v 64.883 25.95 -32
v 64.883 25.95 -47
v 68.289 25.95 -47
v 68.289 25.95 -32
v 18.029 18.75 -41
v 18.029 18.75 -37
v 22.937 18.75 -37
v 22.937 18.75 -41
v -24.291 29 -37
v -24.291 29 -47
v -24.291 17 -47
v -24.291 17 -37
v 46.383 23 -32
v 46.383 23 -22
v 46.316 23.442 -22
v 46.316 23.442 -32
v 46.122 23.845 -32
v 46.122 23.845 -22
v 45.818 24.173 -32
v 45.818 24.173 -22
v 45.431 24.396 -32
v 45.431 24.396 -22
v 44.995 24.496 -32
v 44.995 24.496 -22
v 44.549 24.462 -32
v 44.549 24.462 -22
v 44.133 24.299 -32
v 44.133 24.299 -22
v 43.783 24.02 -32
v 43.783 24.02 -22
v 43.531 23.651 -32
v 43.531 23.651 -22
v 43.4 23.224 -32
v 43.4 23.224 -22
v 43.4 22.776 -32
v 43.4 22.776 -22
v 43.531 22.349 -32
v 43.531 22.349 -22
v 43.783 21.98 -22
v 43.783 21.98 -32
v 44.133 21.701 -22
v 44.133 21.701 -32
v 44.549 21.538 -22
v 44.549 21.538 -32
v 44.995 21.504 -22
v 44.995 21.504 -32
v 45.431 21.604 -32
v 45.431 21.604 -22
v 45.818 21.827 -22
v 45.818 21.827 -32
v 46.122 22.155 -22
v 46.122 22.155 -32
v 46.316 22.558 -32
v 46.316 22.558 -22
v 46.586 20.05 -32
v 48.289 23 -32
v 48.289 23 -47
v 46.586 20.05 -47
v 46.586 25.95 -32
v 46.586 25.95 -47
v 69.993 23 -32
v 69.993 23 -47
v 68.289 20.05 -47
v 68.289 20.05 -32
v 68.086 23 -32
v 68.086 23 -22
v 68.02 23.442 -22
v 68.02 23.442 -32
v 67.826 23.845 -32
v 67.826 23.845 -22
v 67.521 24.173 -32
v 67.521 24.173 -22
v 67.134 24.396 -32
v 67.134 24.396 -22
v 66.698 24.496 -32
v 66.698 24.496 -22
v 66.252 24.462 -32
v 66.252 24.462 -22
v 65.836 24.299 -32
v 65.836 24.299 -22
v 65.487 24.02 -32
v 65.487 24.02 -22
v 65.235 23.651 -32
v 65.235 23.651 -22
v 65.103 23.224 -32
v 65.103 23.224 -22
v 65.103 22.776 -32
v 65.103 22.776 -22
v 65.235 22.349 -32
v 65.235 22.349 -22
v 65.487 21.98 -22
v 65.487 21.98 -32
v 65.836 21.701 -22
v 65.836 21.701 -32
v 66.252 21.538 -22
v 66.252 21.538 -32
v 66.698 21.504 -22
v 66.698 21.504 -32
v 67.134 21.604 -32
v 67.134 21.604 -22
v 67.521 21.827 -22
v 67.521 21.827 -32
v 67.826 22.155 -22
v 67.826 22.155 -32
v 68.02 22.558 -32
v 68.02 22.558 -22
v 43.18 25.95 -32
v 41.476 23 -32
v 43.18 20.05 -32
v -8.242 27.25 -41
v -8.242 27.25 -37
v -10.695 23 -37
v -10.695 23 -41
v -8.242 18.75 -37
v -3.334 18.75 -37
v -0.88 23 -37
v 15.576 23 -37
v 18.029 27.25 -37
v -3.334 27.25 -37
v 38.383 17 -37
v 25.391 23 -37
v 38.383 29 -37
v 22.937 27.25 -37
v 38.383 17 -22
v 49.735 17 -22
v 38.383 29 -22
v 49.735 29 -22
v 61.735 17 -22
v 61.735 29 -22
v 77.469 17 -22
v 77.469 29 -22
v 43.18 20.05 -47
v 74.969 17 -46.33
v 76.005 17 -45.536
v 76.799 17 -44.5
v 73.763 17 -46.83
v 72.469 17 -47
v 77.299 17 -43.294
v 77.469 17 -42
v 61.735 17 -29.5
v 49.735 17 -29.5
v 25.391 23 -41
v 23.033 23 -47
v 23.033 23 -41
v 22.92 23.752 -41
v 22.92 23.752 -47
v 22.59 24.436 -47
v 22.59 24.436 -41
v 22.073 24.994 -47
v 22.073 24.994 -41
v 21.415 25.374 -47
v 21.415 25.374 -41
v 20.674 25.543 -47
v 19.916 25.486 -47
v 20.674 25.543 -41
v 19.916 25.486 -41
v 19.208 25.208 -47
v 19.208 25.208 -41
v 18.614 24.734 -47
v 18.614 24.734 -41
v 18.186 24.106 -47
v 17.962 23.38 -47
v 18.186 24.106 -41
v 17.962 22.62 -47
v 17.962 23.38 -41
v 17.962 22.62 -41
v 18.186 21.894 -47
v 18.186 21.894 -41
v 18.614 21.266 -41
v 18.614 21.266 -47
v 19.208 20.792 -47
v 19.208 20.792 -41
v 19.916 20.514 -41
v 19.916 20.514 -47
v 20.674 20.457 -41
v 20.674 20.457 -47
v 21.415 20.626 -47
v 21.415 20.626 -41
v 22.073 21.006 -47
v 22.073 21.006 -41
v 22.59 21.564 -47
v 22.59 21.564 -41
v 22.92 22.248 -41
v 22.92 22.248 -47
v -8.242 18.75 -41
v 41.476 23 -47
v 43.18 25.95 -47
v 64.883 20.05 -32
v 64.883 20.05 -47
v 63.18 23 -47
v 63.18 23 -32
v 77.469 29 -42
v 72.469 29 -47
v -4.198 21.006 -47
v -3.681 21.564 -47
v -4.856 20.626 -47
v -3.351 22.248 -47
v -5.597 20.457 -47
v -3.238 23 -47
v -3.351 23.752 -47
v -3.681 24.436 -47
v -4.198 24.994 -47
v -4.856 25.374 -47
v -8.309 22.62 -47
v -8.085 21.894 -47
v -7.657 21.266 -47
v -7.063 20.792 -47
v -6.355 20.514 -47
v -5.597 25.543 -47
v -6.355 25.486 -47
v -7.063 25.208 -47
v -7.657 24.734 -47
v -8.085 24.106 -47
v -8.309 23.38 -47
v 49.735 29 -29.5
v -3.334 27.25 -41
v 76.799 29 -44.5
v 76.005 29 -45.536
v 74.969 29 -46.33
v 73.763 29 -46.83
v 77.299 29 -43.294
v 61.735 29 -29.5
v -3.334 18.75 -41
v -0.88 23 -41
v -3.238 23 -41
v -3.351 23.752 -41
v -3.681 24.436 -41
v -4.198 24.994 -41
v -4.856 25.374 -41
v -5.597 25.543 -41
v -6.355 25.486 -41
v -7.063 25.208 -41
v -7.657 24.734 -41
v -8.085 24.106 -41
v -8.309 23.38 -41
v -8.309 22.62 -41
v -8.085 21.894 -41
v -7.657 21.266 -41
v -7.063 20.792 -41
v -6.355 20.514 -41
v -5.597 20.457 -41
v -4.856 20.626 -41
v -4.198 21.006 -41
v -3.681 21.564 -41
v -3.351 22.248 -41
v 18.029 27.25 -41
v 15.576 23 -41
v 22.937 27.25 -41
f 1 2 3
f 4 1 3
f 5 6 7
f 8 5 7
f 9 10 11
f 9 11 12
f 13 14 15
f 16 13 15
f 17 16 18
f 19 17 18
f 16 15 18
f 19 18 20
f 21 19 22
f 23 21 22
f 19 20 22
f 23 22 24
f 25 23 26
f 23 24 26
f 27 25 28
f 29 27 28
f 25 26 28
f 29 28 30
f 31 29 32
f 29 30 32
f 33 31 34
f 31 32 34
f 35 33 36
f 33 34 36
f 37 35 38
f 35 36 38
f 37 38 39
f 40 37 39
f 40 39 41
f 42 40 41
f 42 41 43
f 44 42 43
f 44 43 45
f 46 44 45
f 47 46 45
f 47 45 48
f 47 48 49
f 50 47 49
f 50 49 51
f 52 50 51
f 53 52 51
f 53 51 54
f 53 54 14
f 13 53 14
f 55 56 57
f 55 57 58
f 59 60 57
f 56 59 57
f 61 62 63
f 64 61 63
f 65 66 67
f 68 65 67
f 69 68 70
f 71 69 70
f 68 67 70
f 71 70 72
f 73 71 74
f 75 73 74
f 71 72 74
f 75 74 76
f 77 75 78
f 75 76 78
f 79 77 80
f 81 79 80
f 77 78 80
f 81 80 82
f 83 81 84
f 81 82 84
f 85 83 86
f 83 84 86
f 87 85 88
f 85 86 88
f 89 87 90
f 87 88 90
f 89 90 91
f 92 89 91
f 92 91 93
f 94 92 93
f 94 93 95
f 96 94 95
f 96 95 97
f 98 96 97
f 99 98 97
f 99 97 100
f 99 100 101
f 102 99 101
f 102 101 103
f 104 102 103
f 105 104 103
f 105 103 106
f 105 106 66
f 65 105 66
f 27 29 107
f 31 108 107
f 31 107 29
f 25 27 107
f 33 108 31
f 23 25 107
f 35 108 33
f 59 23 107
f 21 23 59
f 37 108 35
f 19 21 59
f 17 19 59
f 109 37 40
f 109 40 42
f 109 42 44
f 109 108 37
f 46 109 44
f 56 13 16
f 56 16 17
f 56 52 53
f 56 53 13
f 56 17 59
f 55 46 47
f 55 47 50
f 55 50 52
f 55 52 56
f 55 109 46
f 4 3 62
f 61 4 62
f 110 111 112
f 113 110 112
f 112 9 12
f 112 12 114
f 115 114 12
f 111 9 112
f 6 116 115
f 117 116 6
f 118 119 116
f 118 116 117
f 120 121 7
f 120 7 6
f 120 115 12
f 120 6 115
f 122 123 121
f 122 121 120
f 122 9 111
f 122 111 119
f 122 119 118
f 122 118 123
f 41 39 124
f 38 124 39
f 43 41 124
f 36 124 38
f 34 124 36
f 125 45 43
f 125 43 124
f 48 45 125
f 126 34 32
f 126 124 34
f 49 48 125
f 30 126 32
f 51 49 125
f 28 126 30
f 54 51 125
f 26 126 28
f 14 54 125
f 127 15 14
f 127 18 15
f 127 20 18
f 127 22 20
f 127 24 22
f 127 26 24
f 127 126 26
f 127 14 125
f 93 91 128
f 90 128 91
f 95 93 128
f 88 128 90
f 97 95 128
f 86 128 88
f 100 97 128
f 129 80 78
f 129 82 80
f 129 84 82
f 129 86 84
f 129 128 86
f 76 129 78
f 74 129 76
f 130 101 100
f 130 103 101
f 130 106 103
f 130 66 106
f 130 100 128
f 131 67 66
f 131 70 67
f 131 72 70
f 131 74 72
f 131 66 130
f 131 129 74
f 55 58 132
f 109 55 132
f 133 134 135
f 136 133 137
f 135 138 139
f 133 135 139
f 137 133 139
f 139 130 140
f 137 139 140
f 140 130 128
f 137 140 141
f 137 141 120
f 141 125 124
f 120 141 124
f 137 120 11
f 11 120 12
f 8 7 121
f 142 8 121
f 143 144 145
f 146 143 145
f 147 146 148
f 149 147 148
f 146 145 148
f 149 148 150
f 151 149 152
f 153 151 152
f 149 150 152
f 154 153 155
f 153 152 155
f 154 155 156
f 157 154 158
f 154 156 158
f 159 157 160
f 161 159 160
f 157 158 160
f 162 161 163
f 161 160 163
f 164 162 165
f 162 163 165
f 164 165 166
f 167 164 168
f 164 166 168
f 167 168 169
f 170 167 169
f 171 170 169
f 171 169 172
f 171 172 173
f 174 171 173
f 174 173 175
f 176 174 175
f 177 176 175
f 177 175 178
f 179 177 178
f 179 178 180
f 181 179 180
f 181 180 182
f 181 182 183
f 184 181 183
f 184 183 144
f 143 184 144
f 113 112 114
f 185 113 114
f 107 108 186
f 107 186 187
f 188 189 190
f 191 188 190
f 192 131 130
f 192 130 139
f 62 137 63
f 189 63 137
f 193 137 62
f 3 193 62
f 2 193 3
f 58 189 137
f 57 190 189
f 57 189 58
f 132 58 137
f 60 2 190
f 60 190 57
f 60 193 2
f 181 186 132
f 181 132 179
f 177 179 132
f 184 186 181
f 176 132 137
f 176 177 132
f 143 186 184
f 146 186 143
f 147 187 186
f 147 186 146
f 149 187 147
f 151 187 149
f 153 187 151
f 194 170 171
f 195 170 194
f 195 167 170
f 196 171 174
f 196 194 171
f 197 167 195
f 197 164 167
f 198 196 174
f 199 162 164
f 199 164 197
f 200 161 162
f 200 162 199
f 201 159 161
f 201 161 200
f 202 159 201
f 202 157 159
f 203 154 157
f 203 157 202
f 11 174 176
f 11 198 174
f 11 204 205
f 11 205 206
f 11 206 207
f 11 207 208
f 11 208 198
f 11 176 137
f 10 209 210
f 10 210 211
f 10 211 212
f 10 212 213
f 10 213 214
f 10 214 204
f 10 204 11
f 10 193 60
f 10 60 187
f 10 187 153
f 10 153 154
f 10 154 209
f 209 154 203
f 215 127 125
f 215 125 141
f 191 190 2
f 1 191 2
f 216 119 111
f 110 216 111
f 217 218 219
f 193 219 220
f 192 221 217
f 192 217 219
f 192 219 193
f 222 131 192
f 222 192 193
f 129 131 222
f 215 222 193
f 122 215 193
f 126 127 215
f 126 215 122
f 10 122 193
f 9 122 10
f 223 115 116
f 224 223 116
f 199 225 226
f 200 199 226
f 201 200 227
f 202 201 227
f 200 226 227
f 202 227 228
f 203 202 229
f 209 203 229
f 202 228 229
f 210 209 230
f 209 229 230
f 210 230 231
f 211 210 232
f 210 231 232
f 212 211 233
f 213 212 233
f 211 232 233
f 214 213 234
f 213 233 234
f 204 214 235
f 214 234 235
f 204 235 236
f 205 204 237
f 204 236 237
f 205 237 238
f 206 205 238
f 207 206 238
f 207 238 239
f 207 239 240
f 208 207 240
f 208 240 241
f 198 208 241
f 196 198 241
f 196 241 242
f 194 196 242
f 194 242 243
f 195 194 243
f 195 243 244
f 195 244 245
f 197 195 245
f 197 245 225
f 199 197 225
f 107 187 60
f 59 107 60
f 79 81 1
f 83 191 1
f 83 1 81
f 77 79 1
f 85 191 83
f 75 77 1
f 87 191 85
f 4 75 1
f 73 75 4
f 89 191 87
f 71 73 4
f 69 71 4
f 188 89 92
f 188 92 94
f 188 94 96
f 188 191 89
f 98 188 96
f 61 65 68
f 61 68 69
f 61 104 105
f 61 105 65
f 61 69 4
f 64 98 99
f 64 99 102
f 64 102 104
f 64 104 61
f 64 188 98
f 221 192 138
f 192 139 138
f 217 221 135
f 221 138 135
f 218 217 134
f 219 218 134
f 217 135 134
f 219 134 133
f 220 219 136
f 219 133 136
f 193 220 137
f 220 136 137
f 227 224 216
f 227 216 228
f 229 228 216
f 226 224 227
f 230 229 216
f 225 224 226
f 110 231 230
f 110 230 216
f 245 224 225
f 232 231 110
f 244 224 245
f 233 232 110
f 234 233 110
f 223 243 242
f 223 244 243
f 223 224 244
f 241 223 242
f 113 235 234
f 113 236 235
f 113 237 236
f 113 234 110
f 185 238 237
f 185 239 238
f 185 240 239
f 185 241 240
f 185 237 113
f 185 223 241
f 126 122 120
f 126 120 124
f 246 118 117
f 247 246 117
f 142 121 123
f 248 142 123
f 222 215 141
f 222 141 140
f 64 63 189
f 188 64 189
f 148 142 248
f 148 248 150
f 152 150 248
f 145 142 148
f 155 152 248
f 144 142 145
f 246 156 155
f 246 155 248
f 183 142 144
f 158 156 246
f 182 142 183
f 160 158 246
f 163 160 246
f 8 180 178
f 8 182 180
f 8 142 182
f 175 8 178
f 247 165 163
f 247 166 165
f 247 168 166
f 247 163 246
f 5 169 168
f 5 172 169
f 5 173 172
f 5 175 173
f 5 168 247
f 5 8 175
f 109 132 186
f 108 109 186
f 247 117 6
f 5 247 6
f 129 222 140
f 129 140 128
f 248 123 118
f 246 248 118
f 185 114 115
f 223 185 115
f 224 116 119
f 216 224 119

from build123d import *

# Parameters (mm, degrees)
PAD015_DEPTH    = 12
SKETCH032_R     = 1.5
POCKET013_DEPTH = 25.001
SKETCH034_R     = 2.55
POCKET014_DEPTH = 25.001
POCKET015_DEPTH = 15
POCKET016_DEPTH = 4
FILLET_R        = 5


with BuildPart() as part:
    # Sketch029 → Pad015 (new body)
    with BuildSketch(Plane.XZ):
        Polygon((77.4690929999, 0), (77.4690929999, -25), (-24.29069, -25), (-24.29069, -15), (38.3828349999, -15), (38.3828349999, 0), (49.7345464999, 0), (49.7345464999, -7.5), (61.7345464999, -7.5), (61.7345464999, 0), align=None)
    extrude(amount=PAD015_DEPTH)

    # Sketch032 → Pocket013 (cut, through all)
    with BuildSketch(Plane.XY):
        with Locations((44.8828349999, -6)):
            Circle(SKETCH032_R)
        with Locations((66.586258, -6)):
            Circle(SKETCH032_R)
    extrude(amount=-POCKET013_DEPTH, mode=Mode.SUBTRACT)

    # Sketch034 → Pocket014 (cut, through all)
    with BuildSketch(Plane.XY):
        with Locations((-5.7879446208, -6)):
            Circle(SKETCH034_R)
        with Locations((20.4831280675, -6)):
            Circle(SKETCH034_R)
    extrude(amount=-POCKET014_DEPTH, mode=Mode.SUBTRACT)

    # Sketch035 (on Face3 of Pocket014) → Pocket015 (cut)
    with BuildSketch(Plane(origin=(0, 0, -25), x_dir=(1, 0, 0), z_dir=(0, 0, -1))):
        Polygon((46.586018294, 8.95), (43.1796517057, 8.95), (41.4764684116, 6), (43.1796517057, 3.05), (46.586018294, 3.05), (48.2892015881, 6), align=None)
        Polygon((68.2894412941, 8.95), (64.8830747059, 8.95), (63.1798914118, 6), (64.8830747059, 3.05), (68.2894412941, 3.05), (69.9926245882, 6), align=None)
    extrude(amount=-POCKET015_DEPTH, mode=Mode.SUBTRACT)

    # Sketch036 (on Face23 of Pocket015) → Pocket016 (cut)
    with BuildSketch(Plane(origin=(0, 0, -15), x_dir=(-1, 0, 0), z_dir=(0, 0, 1))):
        Polygon((-22.9368667116, 10.25), (-25.3906053556, 6), (-22.9368667116, 1.75), (-18.0293894234, 1.75), (-15.5756507794, 6), (-18.0293894234, 10.25), align=None)
        Polygon((3.3342059768, 10.25), (0.8804673327, 6), (3.3342059768, 1.75), (8.2416832649, 1.75), (10.6954219089, 6), (8.2416832649, 10.25), align=None)
    extrude(amount=-POCKET016_DEPTH, mode=Mode.SUBTRACT)

    # Fillet
    fillet_edges = [part.edges().sort_by_distance(p)[0] for p in [
        (77.469093, -6, -25),
    ]]
    fillet(fillet_edges, radius=FILLET_R)


with BuildPart() as part_1:
    # Body005 placement: moved
    add(part.part.moved(Location((0, 29, -22))))


solid = part_1.part
